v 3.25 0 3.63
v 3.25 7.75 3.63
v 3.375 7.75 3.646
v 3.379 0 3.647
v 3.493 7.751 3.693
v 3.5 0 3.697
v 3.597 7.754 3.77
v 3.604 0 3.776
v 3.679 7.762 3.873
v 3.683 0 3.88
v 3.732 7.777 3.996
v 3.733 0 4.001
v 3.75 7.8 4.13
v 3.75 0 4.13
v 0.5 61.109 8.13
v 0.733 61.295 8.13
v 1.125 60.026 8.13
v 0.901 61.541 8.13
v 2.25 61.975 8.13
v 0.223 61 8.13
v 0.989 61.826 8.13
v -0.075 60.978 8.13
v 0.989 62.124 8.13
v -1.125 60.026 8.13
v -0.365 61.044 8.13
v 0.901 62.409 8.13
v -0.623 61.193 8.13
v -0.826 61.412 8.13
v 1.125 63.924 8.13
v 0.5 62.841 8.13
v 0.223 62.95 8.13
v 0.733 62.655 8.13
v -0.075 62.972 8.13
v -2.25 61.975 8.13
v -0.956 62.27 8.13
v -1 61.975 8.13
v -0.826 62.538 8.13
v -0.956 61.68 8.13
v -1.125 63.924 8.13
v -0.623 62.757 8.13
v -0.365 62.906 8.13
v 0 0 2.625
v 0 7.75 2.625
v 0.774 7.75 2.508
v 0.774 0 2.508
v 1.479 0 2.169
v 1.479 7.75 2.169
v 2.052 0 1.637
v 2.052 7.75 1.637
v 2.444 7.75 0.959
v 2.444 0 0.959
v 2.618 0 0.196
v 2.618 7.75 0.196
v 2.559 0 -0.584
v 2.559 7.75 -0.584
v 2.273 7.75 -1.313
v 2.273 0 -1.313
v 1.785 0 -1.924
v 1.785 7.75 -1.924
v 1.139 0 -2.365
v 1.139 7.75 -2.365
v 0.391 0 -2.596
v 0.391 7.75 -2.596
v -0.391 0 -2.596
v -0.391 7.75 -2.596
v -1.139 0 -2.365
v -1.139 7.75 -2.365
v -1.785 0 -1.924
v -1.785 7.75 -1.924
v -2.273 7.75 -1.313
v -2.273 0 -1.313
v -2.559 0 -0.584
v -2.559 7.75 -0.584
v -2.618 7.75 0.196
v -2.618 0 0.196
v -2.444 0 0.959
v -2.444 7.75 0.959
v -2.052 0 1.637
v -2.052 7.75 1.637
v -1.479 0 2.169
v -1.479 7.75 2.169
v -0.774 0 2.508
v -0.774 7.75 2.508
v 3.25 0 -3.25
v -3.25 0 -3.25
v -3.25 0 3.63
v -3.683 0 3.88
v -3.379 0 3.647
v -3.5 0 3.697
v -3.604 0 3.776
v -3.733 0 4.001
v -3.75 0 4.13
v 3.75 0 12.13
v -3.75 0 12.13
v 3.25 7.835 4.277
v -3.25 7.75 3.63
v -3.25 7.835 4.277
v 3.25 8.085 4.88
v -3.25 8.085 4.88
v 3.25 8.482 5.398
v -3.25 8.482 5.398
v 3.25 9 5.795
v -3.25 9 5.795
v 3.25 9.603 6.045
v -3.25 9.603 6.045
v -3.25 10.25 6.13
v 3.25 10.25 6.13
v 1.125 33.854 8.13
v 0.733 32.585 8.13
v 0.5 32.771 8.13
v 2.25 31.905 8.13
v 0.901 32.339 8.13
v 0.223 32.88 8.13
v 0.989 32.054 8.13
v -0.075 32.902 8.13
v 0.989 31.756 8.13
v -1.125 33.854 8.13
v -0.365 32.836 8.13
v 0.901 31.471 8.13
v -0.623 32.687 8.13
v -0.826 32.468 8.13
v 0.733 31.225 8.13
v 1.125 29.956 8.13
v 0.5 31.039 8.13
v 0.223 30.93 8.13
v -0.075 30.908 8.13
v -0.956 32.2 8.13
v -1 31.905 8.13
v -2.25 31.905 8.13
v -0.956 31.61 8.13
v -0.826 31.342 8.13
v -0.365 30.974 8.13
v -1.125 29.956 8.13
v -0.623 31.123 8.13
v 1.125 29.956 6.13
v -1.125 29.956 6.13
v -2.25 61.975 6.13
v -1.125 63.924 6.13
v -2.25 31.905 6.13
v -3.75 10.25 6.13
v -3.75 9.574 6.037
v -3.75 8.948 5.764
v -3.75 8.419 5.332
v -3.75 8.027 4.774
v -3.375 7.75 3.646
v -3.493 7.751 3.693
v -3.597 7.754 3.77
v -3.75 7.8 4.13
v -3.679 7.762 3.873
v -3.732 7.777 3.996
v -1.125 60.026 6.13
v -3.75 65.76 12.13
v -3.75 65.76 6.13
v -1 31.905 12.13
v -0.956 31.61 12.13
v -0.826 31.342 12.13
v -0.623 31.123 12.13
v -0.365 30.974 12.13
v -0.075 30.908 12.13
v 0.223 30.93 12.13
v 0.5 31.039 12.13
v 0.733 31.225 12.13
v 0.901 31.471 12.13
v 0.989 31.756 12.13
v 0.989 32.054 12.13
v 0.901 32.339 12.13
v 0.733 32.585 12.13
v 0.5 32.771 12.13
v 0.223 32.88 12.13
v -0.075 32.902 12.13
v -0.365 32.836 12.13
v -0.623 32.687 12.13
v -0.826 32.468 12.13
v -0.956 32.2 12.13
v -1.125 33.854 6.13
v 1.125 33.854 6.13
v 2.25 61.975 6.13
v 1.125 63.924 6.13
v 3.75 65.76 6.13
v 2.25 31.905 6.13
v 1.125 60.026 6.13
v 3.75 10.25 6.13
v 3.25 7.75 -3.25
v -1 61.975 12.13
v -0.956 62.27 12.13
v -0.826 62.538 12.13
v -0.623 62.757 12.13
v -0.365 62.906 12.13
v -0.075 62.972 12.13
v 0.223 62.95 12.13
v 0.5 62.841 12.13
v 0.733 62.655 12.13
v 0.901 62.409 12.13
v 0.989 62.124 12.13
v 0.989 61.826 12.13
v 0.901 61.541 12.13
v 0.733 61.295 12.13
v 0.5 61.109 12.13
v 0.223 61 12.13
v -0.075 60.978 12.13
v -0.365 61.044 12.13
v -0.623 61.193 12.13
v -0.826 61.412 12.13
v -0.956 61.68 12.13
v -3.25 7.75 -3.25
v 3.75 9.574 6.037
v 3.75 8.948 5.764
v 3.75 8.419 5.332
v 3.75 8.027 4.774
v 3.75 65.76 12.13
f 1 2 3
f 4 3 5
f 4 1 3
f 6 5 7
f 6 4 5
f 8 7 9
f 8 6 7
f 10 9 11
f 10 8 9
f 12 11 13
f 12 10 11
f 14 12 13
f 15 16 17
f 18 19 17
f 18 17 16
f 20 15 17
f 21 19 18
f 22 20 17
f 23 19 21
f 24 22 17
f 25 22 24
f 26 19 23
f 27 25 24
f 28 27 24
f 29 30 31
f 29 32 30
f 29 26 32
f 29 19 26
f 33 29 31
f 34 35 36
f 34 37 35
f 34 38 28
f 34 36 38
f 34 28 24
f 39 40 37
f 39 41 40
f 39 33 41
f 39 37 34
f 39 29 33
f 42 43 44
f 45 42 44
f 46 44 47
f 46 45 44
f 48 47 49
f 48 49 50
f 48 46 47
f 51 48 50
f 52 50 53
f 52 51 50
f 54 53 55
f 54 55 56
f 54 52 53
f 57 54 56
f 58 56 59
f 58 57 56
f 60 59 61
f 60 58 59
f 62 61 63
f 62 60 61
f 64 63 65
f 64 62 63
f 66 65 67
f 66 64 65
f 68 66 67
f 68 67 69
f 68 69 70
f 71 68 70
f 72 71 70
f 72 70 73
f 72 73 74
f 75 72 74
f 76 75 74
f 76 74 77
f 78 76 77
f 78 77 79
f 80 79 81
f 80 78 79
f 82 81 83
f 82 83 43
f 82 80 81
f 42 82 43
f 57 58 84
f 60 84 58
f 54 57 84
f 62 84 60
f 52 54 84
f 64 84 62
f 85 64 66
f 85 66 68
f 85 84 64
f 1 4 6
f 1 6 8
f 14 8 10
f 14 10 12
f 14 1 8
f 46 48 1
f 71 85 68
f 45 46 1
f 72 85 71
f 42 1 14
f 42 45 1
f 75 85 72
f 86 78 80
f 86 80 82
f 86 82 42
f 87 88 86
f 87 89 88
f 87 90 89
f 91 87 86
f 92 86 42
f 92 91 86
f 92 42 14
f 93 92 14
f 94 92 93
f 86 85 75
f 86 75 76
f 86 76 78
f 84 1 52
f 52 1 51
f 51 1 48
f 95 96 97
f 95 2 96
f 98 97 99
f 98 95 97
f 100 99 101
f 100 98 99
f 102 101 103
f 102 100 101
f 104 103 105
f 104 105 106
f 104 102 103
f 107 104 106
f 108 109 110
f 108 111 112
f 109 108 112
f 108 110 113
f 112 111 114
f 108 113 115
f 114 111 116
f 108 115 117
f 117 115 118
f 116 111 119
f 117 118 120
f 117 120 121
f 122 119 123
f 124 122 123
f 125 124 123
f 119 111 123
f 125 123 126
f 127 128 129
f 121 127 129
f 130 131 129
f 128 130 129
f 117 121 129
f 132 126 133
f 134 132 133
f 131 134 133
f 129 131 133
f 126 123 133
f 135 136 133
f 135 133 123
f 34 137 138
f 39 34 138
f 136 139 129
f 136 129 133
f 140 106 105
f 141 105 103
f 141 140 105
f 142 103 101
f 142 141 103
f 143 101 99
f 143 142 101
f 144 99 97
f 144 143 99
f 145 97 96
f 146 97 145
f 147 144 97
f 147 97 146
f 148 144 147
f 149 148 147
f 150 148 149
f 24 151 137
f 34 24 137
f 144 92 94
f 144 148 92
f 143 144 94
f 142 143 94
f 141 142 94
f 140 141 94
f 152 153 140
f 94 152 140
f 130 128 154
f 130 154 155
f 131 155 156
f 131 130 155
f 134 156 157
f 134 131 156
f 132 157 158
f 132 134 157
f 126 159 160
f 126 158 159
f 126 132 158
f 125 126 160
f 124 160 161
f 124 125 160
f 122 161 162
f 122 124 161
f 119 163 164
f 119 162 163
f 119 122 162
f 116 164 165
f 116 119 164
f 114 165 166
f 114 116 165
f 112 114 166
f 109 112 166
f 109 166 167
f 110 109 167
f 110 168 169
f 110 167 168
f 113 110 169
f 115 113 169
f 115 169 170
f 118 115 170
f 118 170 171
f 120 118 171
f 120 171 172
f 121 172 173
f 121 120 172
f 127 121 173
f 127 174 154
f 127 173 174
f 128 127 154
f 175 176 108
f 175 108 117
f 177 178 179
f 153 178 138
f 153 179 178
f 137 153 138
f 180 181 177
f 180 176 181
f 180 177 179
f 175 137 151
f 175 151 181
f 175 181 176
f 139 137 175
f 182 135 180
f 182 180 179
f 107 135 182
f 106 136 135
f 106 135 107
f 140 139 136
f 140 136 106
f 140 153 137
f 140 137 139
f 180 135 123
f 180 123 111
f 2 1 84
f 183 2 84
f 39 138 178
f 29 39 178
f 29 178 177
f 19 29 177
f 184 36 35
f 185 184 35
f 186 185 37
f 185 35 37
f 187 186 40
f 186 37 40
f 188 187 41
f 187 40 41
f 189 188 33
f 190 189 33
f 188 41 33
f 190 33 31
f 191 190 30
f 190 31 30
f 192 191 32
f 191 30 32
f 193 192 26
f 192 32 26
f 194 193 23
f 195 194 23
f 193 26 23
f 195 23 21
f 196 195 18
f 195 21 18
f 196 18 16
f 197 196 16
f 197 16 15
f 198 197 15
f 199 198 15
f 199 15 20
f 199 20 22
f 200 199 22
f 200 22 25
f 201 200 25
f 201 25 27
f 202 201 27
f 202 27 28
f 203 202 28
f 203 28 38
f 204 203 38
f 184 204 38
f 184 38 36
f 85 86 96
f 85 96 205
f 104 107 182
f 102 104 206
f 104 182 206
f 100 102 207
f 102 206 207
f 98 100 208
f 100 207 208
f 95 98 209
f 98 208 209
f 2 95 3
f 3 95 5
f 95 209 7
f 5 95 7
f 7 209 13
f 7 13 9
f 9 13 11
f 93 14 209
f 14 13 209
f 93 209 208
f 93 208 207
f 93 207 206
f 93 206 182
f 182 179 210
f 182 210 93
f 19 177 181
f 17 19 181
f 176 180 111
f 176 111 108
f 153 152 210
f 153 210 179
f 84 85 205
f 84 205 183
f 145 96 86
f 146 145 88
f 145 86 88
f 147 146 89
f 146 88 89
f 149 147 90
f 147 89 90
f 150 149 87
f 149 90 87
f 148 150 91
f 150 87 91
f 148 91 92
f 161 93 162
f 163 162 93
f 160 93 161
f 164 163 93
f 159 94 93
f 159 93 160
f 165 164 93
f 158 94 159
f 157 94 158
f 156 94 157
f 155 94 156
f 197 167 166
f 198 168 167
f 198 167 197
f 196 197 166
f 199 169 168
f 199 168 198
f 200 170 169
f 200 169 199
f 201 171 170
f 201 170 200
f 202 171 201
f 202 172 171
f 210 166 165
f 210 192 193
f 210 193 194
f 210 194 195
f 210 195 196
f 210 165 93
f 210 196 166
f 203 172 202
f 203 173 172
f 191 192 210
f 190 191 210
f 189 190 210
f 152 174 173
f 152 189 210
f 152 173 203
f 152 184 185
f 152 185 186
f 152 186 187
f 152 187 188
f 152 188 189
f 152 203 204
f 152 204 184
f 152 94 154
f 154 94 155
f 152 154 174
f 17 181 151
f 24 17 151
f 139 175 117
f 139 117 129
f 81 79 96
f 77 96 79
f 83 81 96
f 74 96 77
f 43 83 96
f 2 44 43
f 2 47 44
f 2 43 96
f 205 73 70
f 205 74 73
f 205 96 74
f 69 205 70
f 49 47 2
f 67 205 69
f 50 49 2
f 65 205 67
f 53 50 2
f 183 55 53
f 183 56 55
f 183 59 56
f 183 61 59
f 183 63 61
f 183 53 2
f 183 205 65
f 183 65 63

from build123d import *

# Parameters (mm, degrees)
SKETCH1_W           = 6.5
SKETCH1_H           = 6.5
SKETCH1_R           = 2.625
BOSS_EXTRUDE1_DEPTH = 7.75
SKETCH2_W           = 6.5
SKETCH2_H           = 7.75
BOSS_EXTRUDE2_DEPTH = 8.88
SKETCH3_W           = 6.5
SKETCH3_H           = 6
BOSS_EXTRUDE3_DEPTH = 58.01
FILLET1_R           = 2.5
BOSS_EXTRUDE4_START = 0.5
BOSS_EXTRUDE4_DEPTH = 0.5
FILLET2_R           = 0.5
FILLET3_R           = 0.5
SKETCH6_R           = 1
CUT_EXTRUDE3_DEPTH  = 67.53137982
CUT_EXTRUDE4_DEPTH  = 2


with BuildPart() as part:
    # Sketch1 → Boss-Extrude1 (new body)
    with BuildSketch(Plane(origin=(0, 0, 0), x_dir=(1, 0, 0), z_dir=(0, 1, 0))):
        Rectangle(SKETCH1_W, SKETCH1_H)
        with Locations(Location((0, 0, 0), (0, 0, 270))):
            Circle(SKETCH1_R, mode=Mode.SUBTRACT)
    extrude(amount=BOSS_EXTRUDE1_DEPTH)

    # Sketch2 → Boss-Extrude2 (add)
    with BuildSketch(Plane.XY.offset(3.25)):
        with Locations((0, 3.875)):
            Rectangle(SKETCH2_W, SKETCH2_H)
    extrude(amount=BOSS_EXTRUDE2_DEPTH)

    # Sketch3 → Boss-Extrude3 (add)
    with BuildSketch(Plane(origin=(0, 7.75, 0), x_dir=(1, 0, 0), z_dir=(0, 1, 0))):
        with Locations((0, -9.13)):
            Rectangle(SKETCH3_W, SKETCH3_H)
    extrude(amount=BOSS_EXTRUDE3_DEPTH)

    # Fillet1
    fillet1_edges = [part.edges().sort_by_distance(p)[0] for p in [
        (0, 7.75, 6.13),
    ]]
    fillet(fillet1_edges, radius=FILLET1_R)

    # Sketch4 → Boss-Extrude4 (add)
    with BuildSketch(Plane(origin=(3.25, 0, 0), x_dir=(0, 0, -1), z_dir=(1, 0, 0)).offset(BOSS_EXTRUDE4_START)):
        with BuildLine():
            Line((-3.63, 7.75), (-3.63, 0))
            Line((-3.63, 0), (-12.13, 0))
            Line((-12.13, 0), (-12.13, 65.76))
            Line((-12.13, 65.76), (-6.13, 65.76))
            Line((-6.13, 65.76), (-6.13, 10.25))
            ThreePointArc((-6.13, 10.25), (-5.397766953, 8.482233047), (-3.63, 7.75))
        make_face()
    boss_extrude4 = extrude(amount=-BOSS_EXTRUDE4_DEPTH)

    # Fillet2
    fillet2_edges = [part.edges().sort_by_distance(p)[0] for p in [
        (3.75, 3.875, 3.63),
    ]]
    fillet(fillet2_edges, radius=FILLET2_R - 0.0001)  # a hair under: the kernel refuses the full size

    # Mirror1: Boss-Extrude4 across plane
    add(boss_extrude4.mirror(Plane(origin=(0, 0, 0), x_dir=(0, 0, 1), z_dir=(1, 0, 0))))

    # Fillet3
    fillet3_edges = [part.edges().sort_by_distance(p)[0] for p in [
        (-3.75, 3.875, 3.63),
    ]]
    fillet(fillet3_edges, radius=FILLET3_R - 0.0001)  # a hair under: the kernel refuses the full size

    # Sketch6 → Cut-Extrude3 (cut, through all)
    with BuildSketch(Plane(origin=(0, 0, 6.13), x_dir=(-1, 0, 0), z_dir=(0, 0, -1))):
        with Locations((0, 61.975)):
            Circle(SKETCH6_R)
    cut_extrude3 = extrude(amount=-CUT_EXTRUDE3_DEPTH, mode=Mode.SUBTRACT)

    # Sketch6<3> → Cut-Extrude4 (cut)
    with BuildSketch(Plane(origin=(0, 0, 6.13), x_dir=(-1, 0, 0), z_dir=(0, 0, -1))):
        Polygon((2.25, 61.975), (1.125, 63.923557159), (-1.125, 63.923557159), (-2.25, 61.975), (-1.125, 60.026442841), (1.125, 60.026442841), align=None)
    cut_extrude4 = extrude(amount=-CUT_EXTRUDE4_DEPTH, mode=Mode.SUBTRACT)

    # Mirror2: Cut-Extrude3, Cut-Extrude4 across plane
    add(cut_extrude3.mirror(Plane.ZX.offset(46.94)), mode=Mode.SUBTRACT)
    add(cut_extrude4.mirror(Plane.ZX.offset(46.94)), mode=Mode.SUBTRACT)


solid = part.part
